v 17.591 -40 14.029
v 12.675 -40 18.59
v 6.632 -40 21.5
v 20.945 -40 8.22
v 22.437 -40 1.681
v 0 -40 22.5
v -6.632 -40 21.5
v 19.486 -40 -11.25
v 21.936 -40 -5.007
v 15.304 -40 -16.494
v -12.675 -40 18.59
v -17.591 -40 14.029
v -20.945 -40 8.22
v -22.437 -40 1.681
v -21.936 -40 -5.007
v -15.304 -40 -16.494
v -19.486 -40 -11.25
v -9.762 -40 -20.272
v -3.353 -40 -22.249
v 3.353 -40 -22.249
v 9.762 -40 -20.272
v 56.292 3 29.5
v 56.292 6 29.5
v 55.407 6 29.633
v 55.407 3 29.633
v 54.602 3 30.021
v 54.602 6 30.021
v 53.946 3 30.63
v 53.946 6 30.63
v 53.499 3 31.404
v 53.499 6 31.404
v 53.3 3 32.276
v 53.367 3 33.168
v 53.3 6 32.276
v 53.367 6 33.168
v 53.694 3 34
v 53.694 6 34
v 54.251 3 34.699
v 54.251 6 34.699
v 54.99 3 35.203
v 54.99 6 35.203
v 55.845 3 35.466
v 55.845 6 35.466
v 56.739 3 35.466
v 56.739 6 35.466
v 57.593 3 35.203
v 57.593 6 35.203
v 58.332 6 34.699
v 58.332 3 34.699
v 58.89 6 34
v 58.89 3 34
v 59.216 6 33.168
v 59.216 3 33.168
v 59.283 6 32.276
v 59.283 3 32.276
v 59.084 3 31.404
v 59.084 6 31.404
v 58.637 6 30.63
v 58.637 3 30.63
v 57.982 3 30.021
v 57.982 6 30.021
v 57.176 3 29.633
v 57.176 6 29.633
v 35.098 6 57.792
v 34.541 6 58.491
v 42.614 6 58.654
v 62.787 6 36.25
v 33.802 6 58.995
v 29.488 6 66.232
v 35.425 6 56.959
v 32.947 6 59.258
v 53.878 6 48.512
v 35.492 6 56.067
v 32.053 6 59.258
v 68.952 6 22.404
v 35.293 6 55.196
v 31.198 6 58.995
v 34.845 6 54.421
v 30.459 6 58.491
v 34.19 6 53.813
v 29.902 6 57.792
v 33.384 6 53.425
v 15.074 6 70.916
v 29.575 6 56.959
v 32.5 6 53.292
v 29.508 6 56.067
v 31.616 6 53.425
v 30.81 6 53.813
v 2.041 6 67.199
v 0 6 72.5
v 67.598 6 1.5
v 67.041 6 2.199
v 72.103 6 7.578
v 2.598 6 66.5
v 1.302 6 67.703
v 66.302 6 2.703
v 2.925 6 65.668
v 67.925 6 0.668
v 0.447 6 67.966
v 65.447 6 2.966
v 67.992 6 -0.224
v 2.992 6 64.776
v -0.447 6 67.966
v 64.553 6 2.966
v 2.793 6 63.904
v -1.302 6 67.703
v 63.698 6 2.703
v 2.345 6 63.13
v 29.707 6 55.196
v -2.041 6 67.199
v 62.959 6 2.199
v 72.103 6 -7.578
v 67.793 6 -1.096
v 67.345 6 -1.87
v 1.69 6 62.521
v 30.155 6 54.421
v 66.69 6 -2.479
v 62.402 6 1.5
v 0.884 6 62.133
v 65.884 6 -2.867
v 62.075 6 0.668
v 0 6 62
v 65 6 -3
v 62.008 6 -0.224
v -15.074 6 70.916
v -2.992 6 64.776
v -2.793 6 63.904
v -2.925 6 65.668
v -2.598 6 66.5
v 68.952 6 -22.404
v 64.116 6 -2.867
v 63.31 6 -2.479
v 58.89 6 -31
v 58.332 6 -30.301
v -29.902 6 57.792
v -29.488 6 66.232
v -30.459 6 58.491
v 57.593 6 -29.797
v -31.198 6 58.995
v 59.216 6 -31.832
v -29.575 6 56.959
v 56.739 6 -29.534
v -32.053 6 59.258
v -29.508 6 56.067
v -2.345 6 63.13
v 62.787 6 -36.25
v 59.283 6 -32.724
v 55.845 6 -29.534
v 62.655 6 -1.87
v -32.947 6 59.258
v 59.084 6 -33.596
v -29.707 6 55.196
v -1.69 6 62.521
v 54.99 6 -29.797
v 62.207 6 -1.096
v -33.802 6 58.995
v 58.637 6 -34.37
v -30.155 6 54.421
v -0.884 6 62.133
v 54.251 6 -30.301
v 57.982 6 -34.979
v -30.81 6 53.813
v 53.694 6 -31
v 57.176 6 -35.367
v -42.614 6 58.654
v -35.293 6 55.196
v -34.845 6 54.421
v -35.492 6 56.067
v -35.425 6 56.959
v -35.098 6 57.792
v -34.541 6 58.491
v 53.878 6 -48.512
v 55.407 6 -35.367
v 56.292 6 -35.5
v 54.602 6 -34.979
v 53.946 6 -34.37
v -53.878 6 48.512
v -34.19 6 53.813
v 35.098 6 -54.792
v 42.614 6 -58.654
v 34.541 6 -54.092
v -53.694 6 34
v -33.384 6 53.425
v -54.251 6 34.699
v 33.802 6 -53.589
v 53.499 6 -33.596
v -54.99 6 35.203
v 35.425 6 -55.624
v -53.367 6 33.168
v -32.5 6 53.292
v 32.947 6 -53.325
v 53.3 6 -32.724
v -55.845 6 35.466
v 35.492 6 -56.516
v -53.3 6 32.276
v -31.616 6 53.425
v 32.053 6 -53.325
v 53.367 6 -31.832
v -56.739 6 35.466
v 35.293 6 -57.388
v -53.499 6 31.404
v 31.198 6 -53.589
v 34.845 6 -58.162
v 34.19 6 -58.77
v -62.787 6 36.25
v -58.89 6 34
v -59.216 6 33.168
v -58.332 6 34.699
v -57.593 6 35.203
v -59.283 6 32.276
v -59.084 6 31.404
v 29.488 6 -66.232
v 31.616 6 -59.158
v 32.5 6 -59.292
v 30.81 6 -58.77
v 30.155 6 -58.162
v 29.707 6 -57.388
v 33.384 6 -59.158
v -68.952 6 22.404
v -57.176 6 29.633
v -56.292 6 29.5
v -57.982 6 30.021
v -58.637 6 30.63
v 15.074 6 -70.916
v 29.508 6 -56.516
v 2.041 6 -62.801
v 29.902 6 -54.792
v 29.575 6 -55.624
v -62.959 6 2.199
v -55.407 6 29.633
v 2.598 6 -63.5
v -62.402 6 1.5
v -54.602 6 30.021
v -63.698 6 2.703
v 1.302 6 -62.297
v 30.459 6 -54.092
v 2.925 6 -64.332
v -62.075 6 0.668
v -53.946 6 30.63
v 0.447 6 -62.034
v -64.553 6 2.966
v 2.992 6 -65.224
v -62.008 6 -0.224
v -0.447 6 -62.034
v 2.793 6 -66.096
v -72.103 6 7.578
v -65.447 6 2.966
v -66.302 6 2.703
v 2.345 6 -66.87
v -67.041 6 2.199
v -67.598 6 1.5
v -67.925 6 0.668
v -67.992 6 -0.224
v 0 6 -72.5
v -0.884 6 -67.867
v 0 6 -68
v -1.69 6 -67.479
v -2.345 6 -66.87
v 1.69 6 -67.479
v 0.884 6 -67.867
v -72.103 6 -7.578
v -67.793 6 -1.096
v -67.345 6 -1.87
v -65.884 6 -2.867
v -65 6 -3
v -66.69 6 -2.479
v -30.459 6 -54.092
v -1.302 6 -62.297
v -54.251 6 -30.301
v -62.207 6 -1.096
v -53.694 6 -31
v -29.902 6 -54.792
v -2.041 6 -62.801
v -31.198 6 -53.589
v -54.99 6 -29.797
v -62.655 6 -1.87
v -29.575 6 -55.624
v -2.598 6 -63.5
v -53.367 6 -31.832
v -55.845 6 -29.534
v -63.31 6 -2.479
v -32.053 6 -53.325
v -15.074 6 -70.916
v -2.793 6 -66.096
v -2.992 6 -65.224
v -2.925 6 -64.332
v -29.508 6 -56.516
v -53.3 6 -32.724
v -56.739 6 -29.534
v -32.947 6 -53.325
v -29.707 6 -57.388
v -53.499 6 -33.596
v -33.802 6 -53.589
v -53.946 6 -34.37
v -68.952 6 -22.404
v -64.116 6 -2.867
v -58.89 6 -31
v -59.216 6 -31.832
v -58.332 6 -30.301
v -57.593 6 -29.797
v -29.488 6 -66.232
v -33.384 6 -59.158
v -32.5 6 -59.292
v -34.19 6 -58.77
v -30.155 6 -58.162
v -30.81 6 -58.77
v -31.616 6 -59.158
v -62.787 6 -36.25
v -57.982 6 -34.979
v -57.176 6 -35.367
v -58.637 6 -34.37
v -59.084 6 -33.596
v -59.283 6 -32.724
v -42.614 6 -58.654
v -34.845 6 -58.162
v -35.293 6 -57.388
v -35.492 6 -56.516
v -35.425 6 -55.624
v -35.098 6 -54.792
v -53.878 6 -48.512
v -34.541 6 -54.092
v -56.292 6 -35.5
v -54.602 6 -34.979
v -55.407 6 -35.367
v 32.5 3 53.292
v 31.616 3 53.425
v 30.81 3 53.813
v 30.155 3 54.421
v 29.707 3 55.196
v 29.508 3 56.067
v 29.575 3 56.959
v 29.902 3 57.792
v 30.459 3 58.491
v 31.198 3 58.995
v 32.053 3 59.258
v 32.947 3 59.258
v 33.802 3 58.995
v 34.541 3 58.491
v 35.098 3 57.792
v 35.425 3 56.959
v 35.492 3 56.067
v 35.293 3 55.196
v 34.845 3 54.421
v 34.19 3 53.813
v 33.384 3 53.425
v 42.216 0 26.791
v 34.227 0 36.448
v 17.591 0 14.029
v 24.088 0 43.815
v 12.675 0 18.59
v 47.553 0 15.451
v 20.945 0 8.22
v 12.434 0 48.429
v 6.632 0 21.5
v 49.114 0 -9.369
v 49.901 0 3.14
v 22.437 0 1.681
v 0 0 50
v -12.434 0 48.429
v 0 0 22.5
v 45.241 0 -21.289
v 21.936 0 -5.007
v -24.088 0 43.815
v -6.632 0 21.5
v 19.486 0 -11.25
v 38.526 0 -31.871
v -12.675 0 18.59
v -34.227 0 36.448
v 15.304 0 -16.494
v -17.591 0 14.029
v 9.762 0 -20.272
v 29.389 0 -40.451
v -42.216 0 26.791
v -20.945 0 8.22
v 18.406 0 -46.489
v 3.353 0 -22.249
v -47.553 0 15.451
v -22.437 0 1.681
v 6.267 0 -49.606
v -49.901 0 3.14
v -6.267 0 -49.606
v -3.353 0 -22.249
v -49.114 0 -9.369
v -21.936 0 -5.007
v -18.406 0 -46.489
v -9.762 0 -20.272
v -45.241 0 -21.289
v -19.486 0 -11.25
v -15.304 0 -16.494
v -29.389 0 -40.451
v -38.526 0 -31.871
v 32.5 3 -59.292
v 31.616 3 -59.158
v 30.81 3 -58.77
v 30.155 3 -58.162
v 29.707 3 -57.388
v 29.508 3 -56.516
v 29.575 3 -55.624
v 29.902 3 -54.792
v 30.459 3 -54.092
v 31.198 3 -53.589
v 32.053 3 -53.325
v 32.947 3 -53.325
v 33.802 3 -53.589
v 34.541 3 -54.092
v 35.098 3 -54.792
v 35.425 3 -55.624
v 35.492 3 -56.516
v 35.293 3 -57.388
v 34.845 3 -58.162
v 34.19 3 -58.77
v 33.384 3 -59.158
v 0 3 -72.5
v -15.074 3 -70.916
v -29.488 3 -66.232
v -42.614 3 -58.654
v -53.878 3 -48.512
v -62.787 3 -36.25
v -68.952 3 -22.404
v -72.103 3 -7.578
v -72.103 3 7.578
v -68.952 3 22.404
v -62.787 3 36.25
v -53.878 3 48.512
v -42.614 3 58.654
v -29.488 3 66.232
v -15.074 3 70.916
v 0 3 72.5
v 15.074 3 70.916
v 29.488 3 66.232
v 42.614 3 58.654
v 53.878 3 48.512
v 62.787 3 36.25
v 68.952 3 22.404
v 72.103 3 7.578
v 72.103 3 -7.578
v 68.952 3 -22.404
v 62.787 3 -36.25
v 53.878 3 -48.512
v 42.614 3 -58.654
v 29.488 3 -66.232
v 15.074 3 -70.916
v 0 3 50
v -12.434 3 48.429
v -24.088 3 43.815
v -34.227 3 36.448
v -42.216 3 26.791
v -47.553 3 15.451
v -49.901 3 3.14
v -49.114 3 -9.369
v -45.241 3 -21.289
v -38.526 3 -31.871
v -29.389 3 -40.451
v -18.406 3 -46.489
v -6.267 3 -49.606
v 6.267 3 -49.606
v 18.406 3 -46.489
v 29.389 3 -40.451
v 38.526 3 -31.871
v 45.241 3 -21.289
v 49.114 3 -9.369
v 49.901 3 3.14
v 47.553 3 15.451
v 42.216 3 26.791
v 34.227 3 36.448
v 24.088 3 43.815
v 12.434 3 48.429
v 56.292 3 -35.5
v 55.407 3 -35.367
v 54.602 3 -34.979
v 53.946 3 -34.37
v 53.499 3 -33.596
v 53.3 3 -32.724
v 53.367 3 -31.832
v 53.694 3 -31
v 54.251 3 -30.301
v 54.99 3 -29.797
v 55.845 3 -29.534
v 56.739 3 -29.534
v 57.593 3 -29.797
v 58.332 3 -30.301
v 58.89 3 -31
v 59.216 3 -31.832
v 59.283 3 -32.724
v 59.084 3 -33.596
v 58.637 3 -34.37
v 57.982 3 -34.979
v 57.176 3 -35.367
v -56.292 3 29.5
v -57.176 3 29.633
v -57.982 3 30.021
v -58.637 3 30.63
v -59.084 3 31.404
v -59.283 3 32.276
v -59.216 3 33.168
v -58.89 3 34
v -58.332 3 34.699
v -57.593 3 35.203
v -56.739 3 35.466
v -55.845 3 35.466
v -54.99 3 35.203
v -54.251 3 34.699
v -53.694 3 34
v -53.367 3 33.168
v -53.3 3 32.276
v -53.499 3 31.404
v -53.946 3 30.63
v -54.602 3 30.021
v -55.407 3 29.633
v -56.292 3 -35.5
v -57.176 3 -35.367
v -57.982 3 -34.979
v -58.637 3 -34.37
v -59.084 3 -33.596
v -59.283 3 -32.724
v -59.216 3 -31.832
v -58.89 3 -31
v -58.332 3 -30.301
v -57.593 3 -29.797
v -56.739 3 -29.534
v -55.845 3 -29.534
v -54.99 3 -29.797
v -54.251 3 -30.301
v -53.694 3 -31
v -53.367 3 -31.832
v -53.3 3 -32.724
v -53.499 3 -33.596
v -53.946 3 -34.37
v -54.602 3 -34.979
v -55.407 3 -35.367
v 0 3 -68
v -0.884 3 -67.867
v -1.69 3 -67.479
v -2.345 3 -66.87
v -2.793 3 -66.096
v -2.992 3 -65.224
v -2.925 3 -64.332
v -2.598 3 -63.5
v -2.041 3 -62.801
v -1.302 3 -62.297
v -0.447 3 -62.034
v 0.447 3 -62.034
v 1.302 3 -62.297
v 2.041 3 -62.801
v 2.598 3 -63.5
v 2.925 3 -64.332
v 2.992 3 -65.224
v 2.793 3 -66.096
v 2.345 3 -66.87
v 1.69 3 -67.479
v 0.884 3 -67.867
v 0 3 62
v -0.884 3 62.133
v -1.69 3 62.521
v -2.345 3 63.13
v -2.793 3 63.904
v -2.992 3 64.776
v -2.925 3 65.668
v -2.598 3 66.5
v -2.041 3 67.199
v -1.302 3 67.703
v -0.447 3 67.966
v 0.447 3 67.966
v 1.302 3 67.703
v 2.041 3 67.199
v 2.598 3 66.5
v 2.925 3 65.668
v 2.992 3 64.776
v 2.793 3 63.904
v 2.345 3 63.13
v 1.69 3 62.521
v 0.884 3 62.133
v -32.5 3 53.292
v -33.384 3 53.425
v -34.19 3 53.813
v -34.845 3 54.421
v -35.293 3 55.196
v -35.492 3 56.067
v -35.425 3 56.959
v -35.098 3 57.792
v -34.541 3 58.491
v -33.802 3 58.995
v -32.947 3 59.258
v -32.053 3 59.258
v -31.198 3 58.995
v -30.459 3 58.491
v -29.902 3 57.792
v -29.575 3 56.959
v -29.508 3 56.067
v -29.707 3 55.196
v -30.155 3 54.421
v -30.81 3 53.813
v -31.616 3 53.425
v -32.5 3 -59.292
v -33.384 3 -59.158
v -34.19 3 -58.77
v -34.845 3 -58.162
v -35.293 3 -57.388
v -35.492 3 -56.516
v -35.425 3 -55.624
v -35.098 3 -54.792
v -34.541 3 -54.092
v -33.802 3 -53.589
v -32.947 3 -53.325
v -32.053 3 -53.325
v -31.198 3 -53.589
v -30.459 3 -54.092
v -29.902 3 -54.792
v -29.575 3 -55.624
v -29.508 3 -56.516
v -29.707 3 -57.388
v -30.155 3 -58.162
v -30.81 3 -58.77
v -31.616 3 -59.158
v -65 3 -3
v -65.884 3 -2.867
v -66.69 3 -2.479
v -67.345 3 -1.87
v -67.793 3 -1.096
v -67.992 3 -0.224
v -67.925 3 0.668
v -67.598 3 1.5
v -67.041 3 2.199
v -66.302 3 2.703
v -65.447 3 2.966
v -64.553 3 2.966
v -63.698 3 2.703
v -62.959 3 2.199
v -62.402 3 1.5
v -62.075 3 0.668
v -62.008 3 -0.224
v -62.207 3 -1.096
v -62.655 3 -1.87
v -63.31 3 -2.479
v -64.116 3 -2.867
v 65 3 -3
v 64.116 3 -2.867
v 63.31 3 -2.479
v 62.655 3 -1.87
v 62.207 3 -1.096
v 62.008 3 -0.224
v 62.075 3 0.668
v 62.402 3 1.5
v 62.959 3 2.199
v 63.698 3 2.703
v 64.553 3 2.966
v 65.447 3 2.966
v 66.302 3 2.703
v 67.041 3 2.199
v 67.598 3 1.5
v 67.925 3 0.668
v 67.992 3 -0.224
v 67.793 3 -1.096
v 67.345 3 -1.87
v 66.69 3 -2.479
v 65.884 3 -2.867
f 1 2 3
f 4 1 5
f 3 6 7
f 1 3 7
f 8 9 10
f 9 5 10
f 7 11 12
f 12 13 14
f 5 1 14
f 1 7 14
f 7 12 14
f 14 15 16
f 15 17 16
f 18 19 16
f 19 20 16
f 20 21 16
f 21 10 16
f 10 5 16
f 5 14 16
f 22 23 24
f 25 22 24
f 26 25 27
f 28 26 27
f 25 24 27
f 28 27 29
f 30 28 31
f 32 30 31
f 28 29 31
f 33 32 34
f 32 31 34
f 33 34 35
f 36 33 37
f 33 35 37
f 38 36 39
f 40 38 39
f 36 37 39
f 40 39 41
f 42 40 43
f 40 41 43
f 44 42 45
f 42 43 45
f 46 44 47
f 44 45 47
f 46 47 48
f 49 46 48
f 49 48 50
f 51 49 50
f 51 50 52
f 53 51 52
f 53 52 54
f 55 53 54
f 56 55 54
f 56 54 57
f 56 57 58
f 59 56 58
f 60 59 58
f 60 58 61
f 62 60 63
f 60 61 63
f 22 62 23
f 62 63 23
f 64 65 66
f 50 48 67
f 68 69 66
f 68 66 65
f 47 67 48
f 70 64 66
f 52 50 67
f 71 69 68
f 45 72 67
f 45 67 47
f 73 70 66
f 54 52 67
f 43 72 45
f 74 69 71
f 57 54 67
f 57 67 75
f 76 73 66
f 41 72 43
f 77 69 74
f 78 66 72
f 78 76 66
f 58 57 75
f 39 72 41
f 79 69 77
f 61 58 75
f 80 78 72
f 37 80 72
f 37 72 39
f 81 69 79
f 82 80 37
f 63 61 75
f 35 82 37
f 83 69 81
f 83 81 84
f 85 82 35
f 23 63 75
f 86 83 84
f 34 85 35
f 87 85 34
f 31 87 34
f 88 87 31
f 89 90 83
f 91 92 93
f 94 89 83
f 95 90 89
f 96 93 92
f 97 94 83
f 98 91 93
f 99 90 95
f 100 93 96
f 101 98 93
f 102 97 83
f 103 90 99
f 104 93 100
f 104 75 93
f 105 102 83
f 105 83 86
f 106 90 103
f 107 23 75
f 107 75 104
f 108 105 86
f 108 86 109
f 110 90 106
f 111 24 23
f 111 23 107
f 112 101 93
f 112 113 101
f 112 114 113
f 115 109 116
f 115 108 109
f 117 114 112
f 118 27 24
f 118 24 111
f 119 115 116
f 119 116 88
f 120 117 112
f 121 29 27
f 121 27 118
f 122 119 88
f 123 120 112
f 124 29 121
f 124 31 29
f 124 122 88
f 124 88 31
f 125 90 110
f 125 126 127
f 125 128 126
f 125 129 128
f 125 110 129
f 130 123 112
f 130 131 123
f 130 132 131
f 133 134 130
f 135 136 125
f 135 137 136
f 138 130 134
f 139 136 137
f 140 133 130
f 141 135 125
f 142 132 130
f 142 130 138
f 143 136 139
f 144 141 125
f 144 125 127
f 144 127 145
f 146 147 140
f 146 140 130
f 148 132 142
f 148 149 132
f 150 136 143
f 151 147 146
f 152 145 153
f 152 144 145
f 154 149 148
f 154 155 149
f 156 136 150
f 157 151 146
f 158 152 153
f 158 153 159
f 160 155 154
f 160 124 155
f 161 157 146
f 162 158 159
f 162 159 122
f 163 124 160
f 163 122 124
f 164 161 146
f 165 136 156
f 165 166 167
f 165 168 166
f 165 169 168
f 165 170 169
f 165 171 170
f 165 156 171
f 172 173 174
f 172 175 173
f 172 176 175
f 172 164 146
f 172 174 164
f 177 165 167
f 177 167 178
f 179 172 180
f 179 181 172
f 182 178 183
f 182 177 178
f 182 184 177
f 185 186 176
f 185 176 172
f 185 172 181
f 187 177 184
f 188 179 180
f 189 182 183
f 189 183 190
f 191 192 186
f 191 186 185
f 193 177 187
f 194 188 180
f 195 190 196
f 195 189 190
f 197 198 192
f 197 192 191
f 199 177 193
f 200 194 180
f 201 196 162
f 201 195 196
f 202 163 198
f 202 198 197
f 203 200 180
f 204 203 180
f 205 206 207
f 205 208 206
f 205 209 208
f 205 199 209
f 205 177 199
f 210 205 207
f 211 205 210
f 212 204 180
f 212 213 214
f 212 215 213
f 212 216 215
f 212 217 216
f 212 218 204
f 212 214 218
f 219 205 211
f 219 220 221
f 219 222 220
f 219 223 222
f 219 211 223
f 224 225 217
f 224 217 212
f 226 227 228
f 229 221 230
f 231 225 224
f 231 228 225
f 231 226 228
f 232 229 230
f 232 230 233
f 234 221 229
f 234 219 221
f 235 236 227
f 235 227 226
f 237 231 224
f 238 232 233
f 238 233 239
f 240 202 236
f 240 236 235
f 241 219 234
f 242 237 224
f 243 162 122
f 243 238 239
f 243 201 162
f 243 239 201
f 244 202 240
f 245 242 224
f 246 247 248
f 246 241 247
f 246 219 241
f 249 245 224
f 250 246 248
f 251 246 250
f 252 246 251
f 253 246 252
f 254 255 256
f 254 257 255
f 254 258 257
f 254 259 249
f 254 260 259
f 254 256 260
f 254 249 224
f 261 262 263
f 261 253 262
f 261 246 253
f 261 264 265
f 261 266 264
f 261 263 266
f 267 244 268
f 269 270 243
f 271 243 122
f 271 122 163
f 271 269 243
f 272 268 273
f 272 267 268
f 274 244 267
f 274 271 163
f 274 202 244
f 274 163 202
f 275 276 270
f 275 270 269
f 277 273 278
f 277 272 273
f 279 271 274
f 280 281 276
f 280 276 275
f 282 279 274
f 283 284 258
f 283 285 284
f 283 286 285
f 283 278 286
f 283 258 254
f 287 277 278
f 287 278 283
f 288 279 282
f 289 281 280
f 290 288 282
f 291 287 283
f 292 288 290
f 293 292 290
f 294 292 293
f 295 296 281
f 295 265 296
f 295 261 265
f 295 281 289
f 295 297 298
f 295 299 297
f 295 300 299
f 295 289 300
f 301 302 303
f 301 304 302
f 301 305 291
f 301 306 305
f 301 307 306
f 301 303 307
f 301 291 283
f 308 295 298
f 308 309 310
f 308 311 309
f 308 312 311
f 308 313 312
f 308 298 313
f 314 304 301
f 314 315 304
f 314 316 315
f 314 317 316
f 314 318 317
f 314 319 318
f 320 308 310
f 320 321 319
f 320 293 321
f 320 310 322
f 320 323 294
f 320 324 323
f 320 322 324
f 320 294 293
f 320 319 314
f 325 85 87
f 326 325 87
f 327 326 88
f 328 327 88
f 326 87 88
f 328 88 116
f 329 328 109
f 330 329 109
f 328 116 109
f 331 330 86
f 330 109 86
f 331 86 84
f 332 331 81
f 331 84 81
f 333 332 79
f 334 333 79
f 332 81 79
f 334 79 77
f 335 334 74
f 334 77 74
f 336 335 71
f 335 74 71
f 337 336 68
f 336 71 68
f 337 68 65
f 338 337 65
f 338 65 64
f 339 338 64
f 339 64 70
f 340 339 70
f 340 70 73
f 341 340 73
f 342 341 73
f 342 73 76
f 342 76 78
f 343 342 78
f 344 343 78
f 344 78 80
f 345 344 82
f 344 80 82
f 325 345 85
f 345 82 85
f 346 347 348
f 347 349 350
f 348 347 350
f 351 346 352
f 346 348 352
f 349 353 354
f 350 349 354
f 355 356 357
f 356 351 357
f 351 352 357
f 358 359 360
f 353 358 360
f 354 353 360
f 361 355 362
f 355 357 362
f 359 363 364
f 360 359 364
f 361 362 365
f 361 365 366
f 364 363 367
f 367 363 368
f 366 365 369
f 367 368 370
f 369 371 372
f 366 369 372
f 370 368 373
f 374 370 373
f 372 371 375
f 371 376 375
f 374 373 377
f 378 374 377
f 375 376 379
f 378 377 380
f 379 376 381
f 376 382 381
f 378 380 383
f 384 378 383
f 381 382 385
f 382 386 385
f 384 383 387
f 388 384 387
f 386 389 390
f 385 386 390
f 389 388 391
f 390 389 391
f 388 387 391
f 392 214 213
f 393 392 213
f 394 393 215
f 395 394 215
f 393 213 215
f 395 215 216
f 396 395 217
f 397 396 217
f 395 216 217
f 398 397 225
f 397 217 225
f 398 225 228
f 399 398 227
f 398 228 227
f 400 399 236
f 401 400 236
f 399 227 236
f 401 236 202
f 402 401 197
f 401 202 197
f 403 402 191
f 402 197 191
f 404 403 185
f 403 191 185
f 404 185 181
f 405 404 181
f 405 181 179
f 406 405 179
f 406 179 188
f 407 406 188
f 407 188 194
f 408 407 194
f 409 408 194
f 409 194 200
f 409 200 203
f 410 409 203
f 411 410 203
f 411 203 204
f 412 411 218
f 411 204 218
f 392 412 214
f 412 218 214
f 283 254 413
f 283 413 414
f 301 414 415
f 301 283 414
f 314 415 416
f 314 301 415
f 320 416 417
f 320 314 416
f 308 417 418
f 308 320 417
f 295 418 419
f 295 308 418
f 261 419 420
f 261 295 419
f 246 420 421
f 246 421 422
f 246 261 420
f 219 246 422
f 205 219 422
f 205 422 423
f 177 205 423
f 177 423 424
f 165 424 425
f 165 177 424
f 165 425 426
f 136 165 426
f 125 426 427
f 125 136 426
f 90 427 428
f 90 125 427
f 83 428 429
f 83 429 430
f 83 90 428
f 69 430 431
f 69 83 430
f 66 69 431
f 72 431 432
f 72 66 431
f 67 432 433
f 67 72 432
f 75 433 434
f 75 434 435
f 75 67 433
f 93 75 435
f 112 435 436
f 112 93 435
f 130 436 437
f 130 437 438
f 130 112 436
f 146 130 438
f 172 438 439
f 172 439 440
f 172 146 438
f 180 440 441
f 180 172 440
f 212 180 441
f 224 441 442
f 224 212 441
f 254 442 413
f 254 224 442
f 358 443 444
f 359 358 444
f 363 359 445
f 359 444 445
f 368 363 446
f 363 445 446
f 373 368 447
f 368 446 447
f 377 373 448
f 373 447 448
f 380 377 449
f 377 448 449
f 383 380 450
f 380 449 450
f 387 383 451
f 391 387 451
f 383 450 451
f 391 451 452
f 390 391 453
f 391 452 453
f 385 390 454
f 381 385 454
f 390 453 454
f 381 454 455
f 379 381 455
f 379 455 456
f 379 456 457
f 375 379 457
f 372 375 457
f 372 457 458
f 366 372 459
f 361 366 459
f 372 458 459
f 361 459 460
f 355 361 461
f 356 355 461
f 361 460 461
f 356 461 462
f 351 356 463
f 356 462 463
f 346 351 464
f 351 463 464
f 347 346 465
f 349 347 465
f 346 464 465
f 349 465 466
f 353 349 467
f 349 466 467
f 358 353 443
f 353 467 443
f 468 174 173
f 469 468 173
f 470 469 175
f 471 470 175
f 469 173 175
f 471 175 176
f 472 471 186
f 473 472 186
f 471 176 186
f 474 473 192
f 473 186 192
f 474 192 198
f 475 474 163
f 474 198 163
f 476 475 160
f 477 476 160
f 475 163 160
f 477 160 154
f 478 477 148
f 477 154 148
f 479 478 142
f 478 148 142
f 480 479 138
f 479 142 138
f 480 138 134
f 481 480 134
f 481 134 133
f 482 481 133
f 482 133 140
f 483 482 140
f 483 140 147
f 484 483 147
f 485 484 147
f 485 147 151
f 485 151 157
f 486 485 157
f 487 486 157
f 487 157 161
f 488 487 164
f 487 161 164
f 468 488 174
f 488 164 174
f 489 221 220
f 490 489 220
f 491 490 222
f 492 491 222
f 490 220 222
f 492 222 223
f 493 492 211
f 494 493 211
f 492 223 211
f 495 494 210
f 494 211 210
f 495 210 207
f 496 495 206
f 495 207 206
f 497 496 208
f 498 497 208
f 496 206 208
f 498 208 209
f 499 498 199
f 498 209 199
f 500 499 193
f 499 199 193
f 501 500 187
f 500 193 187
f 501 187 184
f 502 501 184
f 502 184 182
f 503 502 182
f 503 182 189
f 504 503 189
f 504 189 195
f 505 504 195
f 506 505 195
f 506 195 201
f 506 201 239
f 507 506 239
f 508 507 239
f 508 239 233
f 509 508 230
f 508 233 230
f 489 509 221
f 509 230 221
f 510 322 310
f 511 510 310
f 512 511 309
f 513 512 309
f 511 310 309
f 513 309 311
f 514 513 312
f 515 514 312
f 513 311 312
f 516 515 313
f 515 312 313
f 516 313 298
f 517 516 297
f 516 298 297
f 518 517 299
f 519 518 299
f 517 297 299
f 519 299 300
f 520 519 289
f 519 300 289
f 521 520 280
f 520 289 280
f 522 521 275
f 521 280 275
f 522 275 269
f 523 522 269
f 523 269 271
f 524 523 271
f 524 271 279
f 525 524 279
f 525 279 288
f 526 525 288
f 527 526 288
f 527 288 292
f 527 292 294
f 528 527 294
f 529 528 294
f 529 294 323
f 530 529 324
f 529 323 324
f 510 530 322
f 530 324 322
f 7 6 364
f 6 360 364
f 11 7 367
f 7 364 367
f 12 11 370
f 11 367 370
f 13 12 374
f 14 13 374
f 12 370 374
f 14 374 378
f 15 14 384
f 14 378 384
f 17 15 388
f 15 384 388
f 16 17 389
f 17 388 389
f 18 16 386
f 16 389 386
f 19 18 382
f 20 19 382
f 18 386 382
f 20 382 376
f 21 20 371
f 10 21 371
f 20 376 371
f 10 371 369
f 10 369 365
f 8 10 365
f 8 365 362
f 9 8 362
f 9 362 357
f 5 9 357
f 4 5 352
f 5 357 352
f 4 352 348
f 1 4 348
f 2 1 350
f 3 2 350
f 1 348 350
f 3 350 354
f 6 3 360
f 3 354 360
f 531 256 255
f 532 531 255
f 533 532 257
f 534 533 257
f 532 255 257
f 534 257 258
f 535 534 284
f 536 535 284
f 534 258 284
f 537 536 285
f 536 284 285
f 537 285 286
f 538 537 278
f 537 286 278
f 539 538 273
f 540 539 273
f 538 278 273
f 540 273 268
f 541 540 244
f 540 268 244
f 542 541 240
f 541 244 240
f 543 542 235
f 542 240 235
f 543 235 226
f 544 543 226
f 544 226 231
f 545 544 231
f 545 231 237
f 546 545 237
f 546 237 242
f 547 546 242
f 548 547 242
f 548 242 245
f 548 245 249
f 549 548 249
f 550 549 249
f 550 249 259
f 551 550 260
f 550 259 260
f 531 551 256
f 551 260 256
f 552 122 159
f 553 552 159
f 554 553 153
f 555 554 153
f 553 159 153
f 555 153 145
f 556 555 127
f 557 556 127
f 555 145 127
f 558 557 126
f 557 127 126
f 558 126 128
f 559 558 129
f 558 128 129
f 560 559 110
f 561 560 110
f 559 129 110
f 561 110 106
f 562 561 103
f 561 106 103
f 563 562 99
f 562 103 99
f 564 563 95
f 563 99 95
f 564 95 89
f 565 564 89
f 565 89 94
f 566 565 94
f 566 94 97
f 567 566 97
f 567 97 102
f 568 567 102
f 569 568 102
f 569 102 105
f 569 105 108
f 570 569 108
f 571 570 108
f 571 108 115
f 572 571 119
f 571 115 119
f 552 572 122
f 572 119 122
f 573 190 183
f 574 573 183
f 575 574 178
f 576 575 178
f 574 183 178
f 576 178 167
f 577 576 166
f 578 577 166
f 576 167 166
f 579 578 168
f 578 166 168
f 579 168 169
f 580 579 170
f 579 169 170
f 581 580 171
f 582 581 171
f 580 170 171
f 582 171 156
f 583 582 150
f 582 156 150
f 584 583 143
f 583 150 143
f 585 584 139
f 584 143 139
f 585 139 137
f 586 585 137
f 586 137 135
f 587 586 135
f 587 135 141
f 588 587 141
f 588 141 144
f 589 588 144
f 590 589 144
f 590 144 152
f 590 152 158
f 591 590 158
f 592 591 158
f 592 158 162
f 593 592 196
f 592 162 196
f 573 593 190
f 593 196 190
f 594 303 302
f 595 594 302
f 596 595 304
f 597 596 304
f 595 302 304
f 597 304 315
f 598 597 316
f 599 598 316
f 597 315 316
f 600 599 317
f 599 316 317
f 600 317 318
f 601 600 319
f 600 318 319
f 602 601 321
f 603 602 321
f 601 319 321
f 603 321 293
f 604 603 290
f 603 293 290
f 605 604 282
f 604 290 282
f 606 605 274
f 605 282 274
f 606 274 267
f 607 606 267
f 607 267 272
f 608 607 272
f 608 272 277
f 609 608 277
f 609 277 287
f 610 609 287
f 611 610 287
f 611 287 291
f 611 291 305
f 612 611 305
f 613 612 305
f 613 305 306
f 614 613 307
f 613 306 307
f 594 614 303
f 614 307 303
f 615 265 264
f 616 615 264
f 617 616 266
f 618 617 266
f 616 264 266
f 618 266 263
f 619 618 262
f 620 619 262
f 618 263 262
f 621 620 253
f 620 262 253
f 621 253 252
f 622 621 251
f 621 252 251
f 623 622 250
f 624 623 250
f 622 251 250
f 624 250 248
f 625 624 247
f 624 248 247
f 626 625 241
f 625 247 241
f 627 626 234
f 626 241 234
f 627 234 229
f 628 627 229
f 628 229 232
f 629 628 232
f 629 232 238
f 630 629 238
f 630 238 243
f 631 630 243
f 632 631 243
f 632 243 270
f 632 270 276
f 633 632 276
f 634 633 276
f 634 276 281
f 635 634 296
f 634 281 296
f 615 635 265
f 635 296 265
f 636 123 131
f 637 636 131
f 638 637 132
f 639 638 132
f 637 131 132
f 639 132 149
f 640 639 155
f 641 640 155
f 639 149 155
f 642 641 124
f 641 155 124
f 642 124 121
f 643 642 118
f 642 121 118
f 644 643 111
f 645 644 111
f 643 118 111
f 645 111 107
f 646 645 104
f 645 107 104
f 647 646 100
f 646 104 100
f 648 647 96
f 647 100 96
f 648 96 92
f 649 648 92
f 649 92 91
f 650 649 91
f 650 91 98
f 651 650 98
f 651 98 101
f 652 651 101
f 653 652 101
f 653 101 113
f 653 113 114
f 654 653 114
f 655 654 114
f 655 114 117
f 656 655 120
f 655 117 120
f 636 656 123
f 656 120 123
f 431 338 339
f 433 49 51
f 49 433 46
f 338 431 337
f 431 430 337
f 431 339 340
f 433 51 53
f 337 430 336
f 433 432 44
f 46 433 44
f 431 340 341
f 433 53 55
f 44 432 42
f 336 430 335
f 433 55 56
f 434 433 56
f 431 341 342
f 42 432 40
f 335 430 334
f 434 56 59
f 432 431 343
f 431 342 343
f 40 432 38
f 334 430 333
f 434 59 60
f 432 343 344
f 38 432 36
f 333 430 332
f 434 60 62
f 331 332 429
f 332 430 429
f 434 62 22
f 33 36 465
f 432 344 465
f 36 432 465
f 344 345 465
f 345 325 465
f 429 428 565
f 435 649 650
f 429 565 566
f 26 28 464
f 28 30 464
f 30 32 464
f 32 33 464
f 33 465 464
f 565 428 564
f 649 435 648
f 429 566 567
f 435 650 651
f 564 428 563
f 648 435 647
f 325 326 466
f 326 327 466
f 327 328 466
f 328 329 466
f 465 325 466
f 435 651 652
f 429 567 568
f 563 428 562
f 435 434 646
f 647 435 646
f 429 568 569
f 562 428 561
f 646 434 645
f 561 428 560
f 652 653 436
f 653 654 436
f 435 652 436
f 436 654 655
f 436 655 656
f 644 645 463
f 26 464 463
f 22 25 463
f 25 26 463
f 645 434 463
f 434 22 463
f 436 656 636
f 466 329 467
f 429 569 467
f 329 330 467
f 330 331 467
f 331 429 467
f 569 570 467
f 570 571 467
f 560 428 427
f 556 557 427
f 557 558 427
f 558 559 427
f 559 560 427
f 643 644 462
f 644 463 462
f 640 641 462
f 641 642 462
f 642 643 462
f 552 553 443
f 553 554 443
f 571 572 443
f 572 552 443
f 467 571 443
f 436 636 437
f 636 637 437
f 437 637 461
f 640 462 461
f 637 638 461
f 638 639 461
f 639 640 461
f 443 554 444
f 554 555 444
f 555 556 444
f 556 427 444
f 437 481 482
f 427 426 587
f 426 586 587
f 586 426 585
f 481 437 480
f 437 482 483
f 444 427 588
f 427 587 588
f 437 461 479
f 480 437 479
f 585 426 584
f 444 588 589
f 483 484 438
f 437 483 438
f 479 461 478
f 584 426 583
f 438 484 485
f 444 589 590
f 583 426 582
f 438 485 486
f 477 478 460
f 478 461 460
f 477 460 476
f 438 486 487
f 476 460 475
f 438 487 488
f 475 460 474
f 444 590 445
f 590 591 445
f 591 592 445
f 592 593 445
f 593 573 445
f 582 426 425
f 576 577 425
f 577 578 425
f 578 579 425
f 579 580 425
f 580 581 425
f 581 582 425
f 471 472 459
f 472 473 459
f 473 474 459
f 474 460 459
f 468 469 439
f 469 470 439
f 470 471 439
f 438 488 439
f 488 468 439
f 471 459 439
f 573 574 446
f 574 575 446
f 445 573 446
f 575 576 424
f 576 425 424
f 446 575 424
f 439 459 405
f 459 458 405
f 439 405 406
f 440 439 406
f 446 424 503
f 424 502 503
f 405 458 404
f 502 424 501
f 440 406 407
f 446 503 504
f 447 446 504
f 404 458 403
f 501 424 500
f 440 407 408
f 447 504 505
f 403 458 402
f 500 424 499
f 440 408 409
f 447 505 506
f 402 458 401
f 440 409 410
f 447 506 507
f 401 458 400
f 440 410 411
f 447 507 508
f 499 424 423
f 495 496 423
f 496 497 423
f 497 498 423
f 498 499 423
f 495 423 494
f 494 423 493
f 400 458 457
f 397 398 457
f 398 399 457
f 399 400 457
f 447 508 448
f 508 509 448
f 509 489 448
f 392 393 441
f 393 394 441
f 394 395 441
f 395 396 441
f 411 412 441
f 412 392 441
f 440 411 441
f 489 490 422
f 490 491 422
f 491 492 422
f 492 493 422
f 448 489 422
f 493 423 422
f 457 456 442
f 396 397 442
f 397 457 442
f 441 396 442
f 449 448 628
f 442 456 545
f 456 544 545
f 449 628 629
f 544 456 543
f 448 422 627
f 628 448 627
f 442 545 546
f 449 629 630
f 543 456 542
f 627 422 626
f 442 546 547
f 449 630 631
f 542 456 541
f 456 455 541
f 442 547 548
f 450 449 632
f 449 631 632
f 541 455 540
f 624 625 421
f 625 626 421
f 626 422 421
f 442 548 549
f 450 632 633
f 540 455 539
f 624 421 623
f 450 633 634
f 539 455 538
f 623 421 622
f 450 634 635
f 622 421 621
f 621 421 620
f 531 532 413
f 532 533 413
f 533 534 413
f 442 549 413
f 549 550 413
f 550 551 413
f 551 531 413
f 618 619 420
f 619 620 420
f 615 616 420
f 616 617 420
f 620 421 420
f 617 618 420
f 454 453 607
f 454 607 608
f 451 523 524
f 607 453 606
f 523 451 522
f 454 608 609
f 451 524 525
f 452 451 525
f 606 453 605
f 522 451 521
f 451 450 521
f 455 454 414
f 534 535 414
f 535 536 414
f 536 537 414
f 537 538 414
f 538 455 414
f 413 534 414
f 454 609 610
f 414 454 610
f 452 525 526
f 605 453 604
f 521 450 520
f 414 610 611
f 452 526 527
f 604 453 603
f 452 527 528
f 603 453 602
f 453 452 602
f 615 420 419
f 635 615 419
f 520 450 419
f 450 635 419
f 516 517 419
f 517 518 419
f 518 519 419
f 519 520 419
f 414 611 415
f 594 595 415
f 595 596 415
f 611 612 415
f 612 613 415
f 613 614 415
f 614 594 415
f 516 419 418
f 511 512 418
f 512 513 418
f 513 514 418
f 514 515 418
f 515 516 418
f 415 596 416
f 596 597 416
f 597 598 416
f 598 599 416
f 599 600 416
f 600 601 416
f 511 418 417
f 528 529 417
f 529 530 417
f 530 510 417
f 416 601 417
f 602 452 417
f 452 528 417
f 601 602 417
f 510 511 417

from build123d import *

# Parameters (mm, degrees)
BOSS_EXTRUDE1_START = 6
SKETCH2_R           = 72.5
SKETCH2_R_2         = 3
BOSS_EXTRUDE1_DEPTH = 3


with BuildPart() as part:
    # Sketch1 → Revolve1 (revolve)
    with BuildSketch(Plane(origin=(0, 0, 0), x_dir=(0, 0, -1), z_dir=(1, 0, 0)), mode=Mode.PRIVATE) as revolve1_sk:
        Polygon((0, 0), (0, -40), (22.5, -40), (22.5, 0), (50, 0), (50, 6), (0, 6), align=None)
    revolve(revolve1_sk.sketch.rotate(Axis((0, 6, 0), (0, -1, 0)), 180), axis=Axis((0, 6, 0), (0, -1, 0)))

    # Sketch2 → Boss-Extrude1 (add)
    with BuildSketch(Plane(origin=(0, 0, 0), x_dir=(1, 0, 0), z_dir=(0, 1, 0)).offset(BOSS_EXTRUDE1_START)):
        with Locations(Location((0, 0, 0), (0, 0, 90))):
            Circle(SKETCH2_R)
        with Locations(Location((0, -65, 0), (0, 0, 90))):
            Circle(SKETCH2_R_2, mode=Mode.SUBTRACT)
        with Locations(Location((-32.5, -56.291651246, 0), (0, 0, 90))):
            Circle(SKETCH2_R_2, mode=Mode.SUBTRACT)
        with Locations(Location((-56.291651246, -32.5, 0), (0, 0, 90))):
            Circle(SKETCH2_R_2, mode=Mode.SUBTRACT)
        with Locations(Location((-65, 0, 0), (0, 0, 90))):
            Circle(SKETCH2_R_2, mode=Mode.SUBTRACT)
        with Locations(Location((-56.291651246, 32.5, 0), (0, 0, 90))):
            Circle(SKETCH2_R_2, mode=Mode.SUBTRACT)
        with Locations(Location((-32.5, 56.291651246, 0), (0, 0, 90))):
            Circle(SKETCH2_R_2, mode=Mode.SUBTRACT)
        with Locations(Location((0, 65, 0), (0, 0, 90))):
            Circle(SKETCH2_R_2, mode=Mode.SUBTRACT)
        with Locations(Location((32.5, 56.291651246, 0), (0, 0, 90))):
            Circle(SKETCH2_R_2, mode=Mode.SUBTRACT)
        with Locations(Location((56.291651246, 32.5, 0), (0, 0, 90))):
            Circle(SKETCH2_R_2, mode=Mode.SUBTRACT)
        with Locations(Location((65, 0, 0), (0, 0, 90))):
            Circle(SKETCH2_R_2, mode=Mode.SUBTRACT)
        with Locations(Location((56.291651246, -32.5, 0), (0, 0, 90))):
            Circle(SKETCH2_R_2, mode=Mode.SUBTRACT)
        with Locations(Location((32.5, -56.291651246, 0), (0, 0, 90))):
            Circle(SKETCH2_R_2, mode=Mode.SUBTRACT)
    extrude(amount=-BOSS_EXTRUDE1_DEPTH)


solid = part.part
